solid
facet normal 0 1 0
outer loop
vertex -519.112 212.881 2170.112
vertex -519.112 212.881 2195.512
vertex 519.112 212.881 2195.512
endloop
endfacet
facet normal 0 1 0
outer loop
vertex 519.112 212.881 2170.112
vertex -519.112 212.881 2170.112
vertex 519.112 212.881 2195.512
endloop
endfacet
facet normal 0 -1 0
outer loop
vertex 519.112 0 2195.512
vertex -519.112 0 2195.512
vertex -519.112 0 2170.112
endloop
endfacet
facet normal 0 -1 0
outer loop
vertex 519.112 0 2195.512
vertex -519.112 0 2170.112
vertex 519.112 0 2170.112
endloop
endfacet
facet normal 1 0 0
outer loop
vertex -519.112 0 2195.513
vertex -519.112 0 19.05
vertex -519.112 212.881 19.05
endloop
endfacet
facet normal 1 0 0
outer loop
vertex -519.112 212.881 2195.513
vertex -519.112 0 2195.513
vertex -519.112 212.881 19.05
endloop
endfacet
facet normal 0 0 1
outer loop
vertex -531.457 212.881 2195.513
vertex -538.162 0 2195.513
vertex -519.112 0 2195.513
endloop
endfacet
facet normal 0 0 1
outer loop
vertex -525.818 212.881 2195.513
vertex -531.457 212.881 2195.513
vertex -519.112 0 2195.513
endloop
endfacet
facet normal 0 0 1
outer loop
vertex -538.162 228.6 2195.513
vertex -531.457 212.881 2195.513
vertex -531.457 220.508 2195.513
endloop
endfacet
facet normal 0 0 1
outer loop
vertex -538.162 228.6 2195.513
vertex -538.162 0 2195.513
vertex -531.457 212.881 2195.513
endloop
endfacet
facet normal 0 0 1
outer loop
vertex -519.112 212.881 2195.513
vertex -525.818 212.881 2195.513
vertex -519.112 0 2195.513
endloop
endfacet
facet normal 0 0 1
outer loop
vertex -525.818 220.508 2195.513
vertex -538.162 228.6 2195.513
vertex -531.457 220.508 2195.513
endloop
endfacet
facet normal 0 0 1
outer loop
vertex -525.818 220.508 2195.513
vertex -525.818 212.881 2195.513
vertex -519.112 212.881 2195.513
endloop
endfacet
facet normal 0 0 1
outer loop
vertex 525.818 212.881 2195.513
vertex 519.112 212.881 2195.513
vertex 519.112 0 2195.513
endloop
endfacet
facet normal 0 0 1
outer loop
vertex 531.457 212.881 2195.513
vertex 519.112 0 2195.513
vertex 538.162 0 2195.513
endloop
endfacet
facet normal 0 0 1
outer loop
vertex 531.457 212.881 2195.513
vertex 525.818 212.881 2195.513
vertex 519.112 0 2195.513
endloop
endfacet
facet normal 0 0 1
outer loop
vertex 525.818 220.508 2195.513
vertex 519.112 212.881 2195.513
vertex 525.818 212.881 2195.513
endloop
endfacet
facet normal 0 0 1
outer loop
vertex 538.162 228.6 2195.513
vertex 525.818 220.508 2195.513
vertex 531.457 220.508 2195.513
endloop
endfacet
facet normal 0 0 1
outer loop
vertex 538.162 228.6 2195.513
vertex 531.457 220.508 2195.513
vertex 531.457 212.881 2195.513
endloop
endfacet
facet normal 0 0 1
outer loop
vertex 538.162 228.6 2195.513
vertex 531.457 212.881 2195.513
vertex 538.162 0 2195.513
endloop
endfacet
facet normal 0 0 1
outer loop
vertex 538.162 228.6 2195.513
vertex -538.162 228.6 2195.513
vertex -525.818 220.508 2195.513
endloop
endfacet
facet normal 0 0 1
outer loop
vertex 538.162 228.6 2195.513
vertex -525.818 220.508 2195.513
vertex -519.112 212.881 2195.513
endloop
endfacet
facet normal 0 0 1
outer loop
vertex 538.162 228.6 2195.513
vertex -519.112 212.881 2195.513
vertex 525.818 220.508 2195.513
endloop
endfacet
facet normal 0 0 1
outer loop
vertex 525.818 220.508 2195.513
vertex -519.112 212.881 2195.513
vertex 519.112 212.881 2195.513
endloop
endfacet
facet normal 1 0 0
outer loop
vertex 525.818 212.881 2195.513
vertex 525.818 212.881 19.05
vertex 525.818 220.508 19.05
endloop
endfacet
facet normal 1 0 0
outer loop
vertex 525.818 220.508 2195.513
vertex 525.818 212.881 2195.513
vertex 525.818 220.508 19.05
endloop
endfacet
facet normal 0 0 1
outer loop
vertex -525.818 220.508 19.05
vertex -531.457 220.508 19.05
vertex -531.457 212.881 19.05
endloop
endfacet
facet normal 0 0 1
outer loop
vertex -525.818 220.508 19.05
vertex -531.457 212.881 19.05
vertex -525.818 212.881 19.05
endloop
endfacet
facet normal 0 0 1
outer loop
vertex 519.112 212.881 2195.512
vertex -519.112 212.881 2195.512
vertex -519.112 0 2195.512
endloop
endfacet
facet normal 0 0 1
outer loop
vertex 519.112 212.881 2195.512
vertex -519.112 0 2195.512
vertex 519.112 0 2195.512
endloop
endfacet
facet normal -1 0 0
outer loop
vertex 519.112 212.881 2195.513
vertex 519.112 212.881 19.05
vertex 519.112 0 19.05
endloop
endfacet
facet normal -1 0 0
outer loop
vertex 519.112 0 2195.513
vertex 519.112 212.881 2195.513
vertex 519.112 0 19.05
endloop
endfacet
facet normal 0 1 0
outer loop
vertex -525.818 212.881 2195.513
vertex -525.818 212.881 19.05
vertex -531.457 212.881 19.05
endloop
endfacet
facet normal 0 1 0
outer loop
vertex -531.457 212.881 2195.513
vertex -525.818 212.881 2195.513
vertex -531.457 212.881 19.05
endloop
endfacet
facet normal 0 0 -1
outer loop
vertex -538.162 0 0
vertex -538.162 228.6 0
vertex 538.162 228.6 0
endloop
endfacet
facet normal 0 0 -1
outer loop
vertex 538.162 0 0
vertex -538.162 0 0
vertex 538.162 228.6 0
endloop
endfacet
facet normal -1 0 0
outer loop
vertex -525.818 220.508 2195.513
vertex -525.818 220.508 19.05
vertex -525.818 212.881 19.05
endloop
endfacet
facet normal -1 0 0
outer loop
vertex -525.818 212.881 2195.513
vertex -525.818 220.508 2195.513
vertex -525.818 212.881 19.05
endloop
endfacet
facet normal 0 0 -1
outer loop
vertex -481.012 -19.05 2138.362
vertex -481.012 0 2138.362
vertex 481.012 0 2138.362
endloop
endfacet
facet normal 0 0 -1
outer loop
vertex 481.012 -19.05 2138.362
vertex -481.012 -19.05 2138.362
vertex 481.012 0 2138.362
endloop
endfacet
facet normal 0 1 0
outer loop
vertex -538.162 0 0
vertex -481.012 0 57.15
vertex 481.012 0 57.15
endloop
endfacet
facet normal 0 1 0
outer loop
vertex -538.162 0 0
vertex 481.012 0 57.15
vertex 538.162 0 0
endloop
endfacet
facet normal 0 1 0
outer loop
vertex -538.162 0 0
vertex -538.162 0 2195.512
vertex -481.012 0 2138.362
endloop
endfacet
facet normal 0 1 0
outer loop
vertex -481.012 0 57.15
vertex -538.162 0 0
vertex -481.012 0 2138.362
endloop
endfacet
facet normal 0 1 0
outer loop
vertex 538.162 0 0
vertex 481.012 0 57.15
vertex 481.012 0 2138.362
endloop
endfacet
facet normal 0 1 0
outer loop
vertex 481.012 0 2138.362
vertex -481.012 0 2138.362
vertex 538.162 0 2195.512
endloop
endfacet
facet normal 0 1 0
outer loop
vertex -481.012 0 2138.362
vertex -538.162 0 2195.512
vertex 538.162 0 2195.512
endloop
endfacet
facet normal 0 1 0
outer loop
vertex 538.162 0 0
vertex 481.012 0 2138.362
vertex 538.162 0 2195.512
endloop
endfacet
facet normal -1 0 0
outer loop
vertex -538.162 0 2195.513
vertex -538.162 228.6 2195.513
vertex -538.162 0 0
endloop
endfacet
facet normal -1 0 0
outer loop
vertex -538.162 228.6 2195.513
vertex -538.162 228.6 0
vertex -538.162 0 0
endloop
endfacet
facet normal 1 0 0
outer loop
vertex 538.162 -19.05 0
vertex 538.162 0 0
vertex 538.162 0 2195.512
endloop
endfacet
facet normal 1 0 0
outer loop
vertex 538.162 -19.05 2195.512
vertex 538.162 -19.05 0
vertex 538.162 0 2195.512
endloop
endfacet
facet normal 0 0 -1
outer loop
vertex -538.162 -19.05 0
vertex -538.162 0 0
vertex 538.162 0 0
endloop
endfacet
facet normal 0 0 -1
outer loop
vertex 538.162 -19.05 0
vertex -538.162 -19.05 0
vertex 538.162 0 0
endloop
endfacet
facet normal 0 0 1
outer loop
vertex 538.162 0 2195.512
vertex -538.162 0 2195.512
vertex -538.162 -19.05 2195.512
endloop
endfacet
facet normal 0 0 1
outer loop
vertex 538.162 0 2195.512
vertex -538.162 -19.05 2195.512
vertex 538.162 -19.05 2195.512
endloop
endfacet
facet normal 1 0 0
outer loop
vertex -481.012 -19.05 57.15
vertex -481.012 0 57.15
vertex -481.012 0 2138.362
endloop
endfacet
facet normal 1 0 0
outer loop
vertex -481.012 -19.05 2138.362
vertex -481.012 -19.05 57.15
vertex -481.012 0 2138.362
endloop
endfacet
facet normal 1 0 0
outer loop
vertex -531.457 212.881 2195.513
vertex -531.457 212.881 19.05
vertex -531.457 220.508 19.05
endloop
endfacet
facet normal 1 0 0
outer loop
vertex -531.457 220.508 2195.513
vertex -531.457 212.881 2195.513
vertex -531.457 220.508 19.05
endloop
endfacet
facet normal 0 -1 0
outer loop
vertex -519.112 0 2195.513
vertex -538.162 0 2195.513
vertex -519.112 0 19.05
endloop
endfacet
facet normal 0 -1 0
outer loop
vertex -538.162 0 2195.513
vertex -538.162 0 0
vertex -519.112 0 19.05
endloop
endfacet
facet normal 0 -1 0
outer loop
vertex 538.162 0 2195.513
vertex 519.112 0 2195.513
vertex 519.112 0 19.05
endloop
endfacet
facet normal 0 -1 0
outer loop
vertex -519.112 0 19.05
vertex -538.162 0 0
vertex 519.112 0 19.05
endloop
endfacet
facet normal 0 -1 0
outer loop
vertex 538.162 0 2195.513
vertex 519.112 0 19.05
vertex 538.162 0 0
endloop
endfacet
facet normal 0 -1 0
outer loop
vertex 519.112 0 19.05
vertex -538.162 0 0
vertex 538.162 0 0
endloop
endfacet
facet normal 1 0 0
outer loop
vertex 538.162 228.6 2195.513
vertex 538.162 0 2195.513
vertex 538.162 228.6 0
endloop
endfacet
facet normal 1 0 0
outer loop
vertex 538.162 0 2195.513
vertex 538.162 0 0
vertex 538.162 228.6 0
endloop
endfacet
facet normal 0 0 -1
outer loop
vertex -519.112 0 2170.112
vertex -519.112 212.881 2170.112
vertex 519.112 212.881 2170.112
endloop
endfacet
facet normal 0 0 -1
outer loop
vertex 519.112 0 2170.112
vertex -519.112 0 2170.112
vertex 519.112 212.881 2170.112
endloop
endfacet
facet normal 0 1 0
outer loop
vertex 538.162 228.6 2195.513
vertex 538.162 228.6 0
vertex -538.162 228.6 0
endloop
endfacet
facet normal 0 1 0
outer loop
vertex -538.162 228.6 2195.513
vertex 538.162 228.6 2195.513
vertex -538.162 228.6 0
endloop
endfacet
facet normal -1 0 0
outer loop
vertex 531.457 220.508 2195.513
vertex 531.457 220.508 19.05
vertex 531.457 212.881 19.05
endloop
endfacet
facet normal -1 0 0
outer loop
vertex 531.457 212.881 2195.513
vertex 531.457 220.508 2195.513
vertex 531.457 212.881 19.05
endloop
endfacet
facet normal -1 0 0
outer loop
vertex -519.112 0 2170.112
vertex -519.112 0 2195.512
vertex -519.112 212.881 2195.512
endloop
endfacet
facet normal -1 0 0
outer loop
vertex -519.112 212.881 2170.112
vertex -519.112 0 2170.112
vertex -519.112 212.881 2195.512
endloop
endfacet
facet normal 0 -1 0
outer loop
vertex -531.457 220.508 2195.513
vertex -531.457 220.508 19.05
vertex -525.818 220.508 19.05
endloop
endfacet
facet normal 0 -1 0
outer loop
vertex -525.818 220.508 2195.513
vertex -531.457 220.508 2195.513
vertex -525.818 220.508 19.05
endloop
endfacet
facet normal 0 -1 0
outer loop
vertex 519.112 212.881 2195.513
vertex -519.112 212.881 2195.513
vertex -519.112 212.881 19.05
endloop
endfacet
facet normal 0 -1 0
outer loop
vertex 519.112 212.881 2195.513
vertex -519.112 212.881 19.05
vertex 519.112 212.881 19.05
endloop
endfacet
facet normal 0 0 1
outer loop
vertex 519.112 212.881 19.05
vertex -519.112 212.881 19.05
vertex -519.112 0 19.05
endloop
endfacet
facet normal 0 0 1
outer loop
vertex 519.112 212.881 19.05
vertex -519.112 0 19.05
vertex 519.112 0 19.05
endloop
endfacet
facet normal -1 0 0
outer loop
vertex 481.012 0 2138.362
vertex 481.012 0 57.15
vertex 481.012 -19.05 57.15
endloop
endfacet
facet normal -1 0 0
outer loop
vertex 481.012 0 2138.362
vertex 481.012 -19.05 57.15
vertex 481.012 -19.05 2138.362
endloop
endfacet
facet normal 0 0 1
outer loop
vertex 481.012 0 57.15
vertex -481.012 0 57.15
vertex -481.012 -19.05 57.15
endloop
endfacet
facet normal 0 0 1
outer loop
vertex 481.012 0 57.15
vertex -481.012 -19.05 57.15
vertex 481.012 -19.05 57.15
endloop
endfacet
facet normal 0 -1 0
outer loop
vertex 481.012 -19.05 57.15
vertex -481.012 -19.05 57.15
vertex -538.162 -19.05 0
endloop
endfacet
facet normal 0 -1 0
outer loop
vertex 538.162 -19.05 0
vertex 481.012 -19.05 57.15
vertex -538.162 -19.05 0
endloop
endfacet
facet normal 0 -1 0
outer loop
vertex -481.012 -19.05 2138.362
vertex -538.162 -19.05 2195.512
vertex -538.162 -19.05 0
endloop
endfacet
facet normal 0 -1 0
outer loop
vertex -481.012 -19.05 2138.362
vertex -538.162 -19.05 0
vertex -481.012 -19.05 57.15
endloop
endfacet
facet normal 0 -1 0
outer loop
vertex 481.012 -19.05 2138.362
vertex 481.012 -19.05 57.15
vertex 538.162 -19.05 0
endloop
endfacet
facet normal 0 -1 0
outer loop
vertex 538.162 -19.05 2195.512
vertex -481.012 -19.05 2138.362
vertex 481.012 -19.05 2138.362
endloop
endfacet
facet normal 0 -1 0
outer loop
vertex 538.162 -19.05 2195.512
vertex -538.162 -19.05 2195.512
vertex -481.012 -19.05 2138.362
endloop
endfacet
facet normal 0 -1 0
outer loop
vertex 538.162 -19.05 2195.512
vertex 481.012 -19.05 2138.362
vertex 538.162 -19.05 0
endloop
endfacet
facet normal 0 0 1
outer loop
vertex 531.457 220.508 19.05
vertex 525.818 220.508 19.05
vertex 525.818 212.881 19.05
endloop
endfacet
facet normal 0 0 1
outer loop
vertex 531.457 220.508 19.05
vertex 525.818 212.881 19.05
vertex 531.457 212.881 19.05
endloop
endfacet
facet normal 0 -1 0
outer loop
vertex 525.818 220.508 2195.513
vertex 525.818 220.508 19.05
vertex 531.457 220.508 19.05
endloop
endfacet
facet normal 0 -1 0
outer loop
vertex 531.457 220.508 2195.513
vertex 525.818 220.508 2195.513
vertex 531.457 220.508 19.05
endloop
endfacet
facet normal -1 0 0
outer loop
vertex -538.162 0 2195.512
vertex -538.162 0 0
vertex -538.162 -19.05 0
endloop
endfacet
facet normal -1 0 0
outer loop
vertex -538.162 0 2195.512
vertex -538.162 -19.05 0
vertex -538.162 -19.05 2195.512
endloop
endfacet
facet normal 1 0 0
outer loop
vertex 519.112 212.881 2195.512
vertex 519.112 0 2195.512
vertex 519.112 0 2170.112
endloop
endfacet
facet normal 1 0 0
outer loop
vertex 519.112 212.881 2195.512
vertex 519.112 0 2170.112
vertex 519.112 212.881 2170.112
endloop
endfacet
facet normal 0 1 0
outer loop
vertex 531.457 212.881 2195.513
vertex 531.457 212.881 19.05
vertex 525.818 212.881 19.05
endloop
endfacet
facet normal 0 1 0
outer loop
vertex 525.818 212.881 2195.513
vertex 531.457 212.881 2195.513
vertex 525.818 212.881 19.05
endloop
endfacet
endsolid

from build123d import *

# Parameters (mm, degrees)
F0_W     = 1076.325
F0_H     = 228.6
F1_DEPTH = 19.05
F4_DEPTH = 2176.4625
F5_W     = 1038.225
F5_H     = 212.880746
F6_DEPTH = 25.4
F7_W     = 1076.325
F7_H     = 2195.5125
F7_W_2   = 962.025
F7_H_2   = 2081.2125
F8_DEPTH = 19.05


with BuildPart() as f1:
    # F0 (on Top) → F1 (new body)
    with BuildSketch(Plane.XY):
        with Locations((0, 114.3)):
            Rectangle(F0_W, F0_H)
    extrude(amount=F1_DEPTH)

    # F3 (on face) → F4 (join)
    with BuildSketch(Plane.XY.offset(19.05)):
        Polygon((0, 228.6), (0, 212.880746), (519.1125, 212.880746), (525.817874, 212.880746), (525.817874, 220.50783), (528.6375, 220.50783), (531.457126, 220.50783), (531.457126, 212.880746), (538.1625, 212.880746), (538.1625, 228.6), align=None)
        Polygon((-538.1625, 228.6), (-538.1625, 212.880746), (-531.457126, 212.880746), (-531.457126, 220.50783), (-528.6375, 220.50783), (-525.817874, 220.50783), (-525.817874, 212.880746), (-519.1125, 212.880746), (0, 212.880746), (0, 228.6), align=None)
        Polygon((-538.1625, 209.55), (-538.1625, 0), (-519.1125, 0), (-519.1125, 209.55), (-519.1125, 212.880746), (-525.817874, 212.880746), (-531.457126, 212.880746), (-538.1625, 212.880746), align=None)
        Polygon((519.1125, 209.55), (519.1125, 0), (538.1625, 0), (538.1625, 212.880746), (531.457126, 212.880746), (525.817874, 212.880746), (519.1125, 212.880746), align=None)
    extrude(amount=F4_DEPTH)


with BuildPart() as f6:
    # F5 (on face) → F6 (new body)
    with BuildSketch(Plane.XY.offset(2195.5125)):
        with Locations((0, 106.440373)):
            Rectangle(F5_W, F5_H)
    extrude(amount=-F6_DEPTH)


with BuildPart() as f8:
    # F7 (on face) → F8 (new body)
    with BuildSketch(Plane.XZ):
        with Locations((0, 1097.75625)):
            Rectangle(F7_W, F7_H)
        with Locations((0, 1097.75625)):
            Rectangle(F7_W_2, F7_H_2, mode=Mode.SUBTRACT)
    extrude(amount=F8_DEPTH)


solid = Compound([f1.part, f6.part, f8.part])
